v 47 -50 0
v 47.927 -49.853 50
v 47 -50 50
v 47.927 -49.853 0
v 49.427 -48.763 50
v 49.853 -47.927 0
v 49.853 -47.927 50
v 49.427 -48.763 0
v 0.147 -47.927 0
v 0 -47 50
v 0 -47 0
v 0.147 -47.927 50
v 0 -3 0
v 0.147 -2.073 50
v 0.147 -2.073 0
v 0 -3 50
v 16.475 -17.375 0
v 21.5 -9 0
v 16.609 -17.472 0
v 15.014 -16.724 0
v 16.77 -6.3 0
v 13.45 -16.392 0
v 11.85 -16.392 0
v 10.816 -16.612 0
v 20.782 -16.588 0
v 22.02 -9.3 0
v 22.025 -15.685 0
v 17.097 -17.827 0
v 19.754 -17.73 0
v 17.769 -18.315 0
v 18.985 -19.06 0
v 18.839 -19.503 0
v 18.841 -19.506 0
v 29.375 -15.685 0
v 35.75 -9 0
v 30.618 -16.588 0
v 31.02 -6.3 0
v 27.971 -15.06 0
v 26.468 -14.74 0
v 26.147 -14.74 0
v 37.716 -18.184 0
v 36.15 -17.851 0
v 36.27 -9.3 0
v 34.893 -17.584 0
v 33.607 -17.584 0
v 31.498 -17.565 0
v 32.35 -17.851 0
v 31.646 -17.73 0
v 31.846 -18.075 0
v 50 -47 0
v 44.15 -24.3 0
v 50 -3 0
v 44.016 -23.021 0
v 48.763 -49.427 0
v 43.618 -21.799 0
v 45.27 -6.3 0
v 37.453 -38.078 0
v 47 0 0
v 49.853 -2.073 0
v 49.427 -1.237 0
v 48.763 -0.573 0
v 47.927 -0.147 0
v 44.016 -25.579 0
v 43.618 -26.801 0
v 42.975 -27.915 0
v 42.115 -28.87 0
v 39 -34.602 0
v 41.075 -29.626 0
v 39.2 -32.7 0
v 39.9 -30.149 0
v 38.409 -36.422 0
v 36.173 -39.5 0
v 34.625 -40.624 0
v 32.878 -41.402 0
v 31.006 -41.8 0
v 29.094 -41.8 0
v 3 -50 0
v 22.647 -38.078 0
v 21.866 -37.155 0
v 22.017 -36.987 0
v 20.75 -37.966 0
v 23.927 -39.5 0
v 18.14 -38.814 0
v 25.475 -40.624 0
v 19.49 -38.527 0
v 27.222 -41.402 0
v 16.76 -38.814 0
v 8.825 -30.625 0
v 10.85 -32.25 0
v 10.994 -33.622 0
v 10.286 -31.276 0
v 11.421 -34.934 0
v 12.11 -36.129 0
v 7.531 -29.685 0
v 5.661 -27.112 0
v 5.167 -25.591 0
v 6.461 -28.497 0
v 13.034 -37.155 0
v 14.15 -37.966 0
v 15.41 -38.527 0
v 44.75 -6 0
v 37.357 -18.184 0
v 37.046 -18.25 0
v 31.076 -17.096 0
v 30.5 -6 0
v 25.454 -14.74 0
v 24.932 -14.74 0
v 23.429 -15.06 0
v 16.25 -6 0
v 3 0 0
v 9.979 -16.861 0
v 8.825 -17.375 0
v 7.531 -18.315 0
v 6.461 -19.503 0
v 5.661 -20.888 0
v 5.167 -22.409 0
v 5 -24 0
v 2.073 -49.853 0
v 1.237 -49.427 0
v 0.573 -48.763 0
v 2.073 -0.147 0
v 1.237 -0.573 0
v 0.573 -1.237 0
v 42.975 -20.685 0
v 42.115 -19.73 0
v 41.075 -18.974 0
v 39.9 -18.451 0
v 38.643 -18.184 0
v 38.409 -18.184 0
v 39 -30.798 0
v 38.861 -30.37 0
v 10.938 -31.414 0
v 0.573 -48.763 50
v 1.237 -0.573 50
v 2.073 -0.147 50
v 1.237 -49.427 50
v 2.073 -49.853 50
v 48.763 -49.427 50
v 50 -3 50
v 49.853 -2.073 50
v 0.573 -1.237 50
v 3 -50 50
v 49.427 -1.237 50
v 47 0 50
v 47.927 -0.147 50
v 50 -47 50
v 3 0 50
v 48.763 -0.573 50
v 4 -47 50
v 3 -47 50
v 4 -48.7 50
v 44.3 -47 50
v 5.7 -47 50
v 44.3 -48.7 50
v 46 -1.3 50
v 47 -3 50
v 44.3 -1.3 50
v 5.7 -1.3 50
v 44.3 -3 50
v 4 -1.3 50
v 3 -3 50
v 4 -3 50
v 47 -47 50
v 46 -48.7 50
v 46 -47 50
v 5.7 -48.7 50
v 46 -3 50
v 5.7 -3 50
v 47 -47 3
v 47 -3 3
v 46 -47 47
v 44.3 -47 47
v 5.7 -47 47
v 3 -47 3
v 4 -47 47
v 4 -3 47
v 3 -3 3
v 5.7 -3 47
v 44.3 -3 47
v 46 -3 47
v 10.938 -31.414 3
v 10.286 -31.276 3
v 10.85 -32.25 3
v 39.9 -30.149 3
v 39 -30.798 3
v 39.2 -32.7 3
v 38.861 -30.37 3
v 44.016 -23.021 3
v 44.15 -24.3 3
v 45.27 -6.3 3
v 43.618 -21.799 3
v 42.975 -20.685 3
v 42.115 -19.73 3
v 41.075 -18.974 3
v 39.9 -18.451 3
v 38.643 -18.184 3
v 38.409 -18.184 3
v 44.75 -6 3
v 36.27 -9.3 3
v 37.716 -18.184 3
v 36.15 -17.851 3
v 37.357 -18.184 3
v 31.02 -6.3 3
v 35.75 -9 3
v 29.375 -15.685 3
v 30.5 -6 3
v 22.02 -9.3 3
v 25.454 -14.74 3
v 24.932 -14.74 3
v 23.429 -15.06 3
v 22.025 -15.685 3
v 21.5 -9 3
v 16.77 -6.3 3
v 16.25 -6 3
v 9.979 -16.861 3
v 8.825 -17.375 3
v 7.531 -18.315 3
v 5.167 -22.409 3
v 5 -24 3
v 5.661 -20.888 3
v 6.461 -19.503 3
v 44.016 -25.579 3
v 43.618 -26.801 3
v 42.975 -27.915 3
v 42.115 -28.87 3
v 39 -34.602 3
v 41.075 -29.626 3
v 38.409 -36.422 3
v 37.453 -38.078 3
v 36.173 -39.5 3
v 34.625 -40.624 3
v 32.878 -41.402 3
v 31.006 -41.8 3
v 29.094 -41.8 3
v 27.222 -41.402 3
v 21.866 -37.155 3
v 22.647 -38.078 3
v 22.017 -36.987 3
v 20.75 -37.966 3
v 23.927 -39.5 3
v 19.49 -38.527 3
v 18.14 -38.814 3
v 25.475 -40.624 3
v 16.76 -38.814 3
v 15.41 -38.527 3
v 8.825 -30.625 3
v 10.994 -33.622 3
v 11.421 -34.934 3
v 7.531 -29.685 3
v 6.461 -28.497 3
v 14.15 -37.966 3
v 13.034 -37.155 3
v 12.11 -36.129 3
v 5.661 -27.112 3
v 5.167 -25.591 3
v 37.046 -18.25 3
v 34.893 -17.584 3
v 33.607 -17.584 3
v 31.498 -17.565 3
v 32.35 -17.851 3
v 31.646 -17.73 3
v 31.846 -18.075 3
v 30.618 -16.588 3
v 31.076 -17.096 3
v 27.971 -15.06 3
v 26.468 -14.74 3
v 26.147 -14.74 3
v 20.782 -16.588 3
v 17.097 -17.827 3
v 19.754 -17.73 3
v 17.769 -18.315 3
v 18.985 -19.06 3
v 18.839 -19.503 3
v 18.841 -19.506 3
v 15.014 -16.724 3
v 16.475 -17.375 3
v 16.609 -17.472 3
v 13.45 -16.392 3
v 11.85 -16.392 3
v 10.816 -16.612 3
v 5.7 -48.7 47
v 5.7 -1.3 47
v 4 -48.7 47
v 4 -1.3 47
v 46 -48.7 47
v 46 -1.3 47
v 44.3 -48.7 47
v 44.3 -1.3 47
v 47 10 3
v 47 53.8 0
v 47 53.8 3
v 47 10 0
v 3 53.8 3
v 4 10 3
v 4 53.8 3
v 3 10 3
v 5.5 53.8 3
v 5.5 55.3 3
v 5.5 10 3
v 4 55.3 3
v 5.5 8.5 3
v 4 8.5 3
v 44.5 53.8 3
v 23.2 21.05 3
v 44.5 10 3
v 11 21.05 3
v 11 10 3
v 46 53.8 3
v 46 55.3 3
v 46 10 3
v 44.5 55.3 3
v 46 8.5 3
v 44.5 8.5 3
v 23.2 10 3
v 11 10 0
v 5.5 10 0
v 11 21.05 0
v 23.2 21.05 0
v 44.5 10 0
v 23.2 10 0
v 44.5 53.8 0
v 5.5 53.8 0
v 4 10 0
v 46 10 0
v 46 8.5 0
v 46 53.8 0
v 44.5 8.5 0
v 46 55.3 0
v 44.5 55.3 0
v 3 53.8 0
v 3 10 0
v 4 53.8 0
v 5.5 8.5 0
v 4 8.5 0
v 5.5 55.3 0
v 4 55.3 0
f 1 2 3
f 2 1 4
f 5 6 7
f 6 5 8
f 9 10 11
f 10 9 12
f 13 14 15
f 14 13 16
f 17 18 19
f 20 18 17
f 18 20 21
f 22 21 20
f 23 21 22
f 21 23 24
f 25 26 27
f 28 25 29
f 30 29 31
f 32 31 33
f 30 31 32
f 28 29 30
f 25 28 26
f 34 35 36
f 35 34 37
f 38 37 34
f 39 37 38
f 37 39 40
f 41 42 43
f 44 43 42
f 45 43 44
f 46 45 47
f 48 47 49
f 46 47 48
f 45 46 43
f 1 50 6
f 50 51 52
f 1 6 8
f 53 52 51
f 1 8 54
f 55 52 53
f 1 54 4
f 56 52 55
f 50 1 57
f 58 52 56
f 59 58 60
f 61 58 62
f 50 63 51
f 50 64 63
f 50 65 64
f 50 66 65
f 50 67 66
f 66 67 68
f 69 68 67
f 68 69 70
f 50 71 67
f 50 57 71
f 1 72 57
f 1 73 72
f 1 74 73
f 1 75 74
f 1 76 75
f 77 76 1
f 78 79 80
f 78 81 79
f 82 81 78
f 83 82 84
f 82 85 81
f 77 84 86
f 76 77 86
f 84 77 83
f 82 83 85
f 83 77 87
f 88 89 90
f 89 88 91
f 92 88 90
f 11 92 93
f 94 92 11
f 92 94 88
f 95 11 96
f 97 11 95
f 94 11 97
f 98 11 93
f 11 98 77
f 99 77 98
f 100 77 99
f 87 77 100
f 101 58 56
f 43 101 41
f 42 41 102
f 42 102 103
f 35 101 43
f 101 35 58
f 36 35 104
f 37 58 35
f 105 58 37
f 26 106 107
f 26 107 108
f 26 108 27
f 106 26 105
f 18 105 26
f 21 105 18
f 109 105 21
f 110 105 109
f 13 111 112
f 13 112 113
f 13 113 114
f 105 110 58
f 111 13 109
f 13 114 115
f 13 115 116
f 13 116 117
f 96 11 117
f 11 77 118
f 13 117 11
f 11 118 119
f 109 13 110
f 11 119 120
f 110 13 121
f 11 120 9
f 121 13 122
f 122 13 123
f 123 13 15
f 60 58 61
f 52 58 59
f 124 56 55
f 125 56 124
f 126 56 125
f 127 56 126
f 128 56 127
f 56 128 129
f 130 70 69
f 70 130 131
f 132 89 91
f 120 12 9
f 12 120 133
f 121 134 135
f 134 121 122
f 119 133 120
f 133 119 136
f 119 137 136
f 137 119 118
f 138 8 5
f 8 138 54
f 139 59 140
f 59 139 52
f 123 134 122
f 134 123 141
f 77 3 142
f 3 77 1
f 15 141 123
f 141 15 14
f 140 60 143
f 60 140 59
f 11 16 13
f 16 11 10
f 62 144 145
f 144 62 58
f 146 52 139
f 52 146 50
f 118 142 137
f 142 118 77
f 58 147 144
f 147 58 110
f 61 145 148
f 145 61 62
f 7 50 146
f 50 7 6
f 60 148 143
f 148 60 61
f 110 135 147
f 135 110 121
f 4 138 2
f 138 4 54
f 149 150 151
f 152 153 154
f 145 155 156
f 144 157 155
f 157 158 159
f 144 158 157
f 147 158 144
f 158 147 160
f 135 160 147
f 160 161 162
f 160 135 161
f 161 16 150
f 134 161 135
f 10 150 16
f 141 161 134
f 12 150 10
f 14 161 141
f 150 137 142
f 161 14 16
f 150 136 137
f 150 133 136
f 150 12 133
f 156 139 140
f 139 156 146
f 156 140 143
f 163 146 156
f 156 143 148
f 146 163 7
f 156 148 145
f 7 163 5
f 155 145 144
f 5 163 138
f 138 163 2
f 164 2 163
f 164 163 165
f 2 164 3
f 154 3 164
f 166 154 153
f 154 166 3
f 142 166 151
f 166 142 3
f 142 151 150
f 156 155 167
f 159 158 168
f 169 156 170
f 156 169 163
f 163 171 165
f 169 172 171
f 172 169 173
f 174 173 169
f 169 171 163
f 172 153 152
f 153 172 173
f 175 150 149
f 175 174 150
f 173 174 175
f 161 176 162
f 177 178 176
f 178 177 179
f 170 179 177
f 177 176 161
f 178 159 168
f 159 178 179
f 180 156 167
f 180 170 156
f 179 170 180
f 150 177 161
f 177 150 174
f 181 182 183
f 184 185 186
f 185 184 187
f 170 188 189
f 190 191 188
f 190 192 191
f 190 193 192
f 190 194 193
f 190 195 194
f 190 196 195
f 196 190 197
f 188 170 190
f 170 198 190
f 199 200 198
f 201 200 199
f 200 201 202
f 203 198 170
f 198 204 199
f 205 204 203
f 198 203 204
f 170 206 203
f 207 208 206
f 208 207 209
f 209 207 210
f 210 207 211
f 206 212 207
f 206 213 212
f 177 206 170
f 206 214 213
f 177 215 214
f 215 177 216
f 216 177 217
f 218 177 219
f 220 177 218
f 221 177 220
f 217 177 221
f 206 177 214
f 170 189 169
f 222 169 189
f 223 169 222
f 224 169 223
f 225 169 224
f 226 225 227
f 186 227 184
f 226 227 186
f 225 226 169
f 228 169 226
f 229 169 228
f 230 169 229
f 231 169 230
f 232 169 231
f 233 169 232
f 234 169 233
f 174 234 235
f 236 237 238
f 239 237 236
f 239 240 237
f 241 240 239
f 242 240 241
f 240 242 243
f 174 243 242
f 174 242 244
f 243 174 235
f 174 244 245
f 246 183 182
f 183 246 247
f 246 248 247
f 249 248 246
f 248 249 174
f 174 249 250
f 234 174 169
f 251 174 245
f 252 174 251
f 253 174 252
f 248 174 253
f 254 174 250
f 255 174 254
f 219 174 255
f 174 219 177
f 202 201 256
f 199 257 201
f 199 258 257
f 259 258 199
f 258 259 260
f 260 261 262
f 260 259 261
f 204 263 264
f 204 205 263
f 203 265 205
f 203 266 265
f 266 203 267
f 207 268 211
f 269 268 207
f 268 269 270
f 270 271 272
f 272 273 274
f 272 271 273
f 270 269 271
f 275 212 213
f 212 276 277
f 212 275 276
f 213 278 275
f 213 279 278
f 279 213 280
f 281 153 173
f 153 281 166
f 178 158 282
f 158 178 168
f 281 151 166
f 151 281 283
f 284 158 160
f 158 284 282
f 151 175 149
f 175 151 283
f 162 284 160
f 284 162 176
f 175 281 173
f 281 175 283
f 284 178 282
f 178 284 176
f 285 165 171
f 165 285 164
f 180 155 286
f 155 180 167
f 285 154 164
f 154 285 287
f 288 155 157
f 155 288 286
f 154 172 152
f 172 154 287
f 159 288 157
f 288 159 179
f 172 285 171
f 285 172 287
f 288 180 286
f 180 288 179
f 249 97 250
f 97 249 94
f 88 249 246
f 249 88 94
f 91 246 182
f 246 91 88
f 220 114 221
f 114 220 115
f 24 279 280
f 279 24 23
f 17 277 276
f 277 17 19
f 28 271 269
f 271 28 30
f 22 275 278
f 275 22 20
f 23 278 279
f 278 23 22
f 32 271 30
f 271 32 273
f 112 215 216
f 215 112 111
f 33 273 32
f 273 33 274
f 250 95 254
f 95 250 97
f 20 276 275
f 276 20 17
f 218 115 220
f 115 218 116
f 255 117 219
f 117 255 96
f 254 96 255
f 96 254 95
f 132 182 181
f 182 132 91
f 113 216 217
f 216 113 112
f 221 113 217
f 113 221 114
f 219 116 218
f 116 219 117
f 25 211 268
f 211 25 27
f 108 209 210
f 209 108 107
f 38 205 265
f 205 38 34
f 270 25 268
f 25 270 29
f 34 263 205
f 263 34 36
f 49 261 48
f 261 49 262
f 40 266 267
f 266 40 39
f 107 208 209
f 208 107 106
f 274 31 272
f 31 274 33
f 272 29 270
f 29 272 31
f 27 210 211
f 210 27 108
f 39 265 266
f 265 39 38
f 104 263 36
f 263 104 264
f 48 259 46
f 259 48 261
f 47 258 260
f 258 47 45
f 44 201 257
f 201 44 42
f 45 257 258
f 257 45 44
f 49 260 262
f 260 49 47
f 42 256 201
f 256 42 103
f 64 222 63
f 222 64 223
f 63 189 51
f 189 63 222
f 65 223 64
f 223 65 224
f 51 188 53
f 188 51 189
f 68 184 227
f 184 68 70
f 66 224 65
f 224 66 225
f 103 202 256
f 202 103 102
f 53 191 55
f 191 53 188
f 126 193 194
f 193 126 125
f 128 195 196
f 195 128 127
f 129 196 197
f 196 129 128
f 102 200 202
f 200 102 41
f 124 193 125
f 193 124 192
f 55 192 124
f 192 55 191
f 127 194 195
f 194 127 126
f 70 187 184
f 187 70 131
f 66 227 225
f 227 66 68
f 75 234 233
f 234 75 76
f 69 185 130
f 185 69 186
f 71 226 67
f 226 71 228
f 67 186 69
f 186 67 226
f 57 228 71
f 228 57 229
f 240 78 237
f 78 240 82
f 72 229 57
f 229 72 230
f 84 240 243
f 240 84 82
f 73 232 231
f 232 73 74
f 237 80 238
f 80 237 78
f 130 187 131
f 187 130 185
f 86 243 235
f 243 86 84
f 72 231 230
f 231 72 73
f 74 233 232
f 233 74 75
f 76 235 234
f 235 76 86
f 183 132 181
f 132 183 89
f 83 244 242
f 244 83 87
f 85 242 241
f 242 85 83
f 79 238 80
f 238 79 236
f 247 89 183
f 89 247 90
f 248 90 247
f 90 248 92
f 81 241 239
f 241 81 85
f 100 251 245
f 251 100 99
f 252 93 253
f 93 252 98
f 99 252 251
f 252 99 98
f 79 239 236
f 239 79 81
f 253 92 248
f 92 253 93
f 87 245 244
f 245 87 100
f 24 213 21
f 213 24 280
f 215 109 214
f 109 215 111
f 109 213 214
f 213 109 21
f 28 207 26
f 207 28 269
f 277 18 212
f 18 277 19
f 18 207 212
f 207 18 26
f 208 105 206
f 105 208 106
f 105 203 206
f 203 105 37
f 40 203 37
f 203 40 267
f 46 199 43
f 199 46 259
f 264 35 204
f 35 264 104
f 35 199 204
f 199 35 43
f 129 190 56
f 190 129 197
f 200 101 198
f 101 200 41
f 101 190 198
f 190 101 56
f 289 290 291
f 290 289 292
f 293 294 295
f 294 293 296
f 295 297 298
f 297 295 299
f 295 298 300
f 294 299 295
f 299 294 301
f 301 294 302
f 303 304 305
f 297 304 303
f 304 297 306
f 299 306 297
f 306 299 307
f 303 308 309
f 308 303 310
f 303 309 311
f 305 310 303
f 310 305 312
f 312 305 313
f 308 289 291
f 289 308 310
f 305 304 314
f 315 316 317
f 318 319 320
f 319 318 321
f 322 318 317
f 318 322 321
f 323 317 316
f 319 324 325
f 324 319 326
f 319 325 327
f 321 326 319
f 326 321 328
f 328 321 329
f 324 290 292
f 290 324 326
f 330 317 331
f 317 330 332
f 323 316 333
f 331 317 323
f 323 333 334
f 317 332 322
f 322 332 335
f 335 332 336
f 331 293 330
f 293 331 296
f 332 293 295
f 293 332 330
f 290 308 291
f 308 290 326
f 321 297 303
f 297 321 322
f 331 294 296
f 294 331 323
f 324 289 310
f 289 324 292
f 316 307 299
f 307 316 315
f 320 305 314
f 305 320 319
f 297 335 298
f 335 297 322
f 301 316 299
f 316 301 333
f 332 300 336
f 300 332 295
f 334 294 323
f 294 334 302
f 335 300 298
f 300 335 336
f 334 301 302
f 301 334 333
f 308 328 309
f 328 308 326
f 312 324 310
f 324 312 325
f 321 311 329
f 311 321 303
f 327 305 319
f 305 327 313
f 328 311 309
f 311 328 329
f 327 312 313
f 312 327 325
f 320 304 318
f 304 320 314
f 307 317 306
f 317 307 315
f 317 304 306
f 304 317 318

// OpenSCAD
h = 50;

l_outer = 50;
l_inner = 44;
wall = (l_outer-l_inner)/2;

wall_diag = sqrt(2*(wall*wall));

plug_w = 12.1;
plug_h = 11.25;

nupsi_w = 1.5;
nupsi_h = 1.5;
nupsi_d = wall;

nupsi_neg_w = nupsi_w + 0.2;
nupsi_neg_h = nupsi_h + 0.2;
nupsi_neg_d = nupsi_d + 0.2;

nupsi_inset = 4;

module roundedRect(size, radius, $fn=20) {
	x = size[0];
	y = size[1];
	z = size[2];

	linear_extrude(height=z)
	hull() {
		translate([radius, radius, 0])
		circle(r=radius);

		translate([x - radius, radius, 0])
		circle(r=radius);

		translate([x - radius, y - radius, 0])
		circle(r=radius);

		translate([radius, y - radius, 0]) circle(r=radius);
	}
}


module the_cube() {
	rounded_c = 3.3;
	difference(){
		rotate([90,0,0]) roundedRect([l_outer,l_outer,l_outer], 3);
		translate([wall, -(wall+l_inner),wall]) cube(size=[l_inner, l_inner+10, l_inner], center = false);
		translate([nupsi_inset, -wall,wall-nupsi_neg_h]) cube([nupsi_neg_w,100, l_inner+2*nupsi_neg_h]);
		translate([l_outer-(nupsi_inset+nupsi_neg_w), -wall,wall-nupsi_neg_h]) cube([nupsi_neg_w,100, l_inner+2*nupsi_neg_h]);
	}
}


module cloud() {
	union(){
		translate([51,0,0]) cylinder(h=h, r=51);
		translate([138,-13,0]) cylinder(h=h, r=49);
		translate([195,-2,0]) cylinder(h=h, r=41);
		translate([220,2,0]) cylinder(h=h, r=41);
		translate([167,58,0]) cylinder(h=h, r=61);
		translate([83,55,0]) cylinder(h=h, r=44);
		translate([75,-120,0]) rotate(a=[0,0,30]) cube([4,120,h]);
		translate([110,-100,0]) rotate(a=[0,0,30]) cube([4,100,h]);
		translate([170,-120,0]) rotate(a=[0,0,30]) cube([4,120,h]);
		translate([205,-100,0]) rotate(a=[0,0,30]) cube([4,100,h]);
		translate([265,-120,0]) rotate(a=[0,0,30]) cube([4,120,h]);
		}
}

module opener1(){
			difference(){
				union(){
					cube(size=[l_inner*0.7,l_inner*0.7,wall]);
					translate([0,(l_inner)/2,wall]) difference() {
						rotate(a=[0,20,0]) cube([10,10,wall], center=true);
						translate([-40,-20,-20]) cube([40,40,40]);
					}
				}
				translate([0,0,-wall]) cube(size=[l_inner,l_inner,wall]);
			}
}

module backplate() {
	translate([wall,10,0]) difference(){
		union(){
			cube(size=[l_inner,l_inner-0.2,wall]);
			translate([nupsi_inset-wall,-nupsi_h,0]) cube([nupsi_w, l_inner+2*nupsi_h-0.2, nupsi_d]);
			translate([(l_outer-wall)-(nupsi_inset+nupsi_w),-nupsi_h,0]) cube([nupsi_w, l_inner+2*nupsi_h-0.2, nupsi_d]);


		}
		translate([8,-0.3,-20]) cube(size=[plug_w+0.1,plug_h+0.1,wall+100]);
	}
}


translate([0,0,l_outer]) rotate(a=[90,0,0]) difference(){
	the_cube();
	translate([5,-l_inner,24]) rotate(a=[90,0,0]) scale(v=[0.15,0.15,0.15]) cloud();
}

backplate();
